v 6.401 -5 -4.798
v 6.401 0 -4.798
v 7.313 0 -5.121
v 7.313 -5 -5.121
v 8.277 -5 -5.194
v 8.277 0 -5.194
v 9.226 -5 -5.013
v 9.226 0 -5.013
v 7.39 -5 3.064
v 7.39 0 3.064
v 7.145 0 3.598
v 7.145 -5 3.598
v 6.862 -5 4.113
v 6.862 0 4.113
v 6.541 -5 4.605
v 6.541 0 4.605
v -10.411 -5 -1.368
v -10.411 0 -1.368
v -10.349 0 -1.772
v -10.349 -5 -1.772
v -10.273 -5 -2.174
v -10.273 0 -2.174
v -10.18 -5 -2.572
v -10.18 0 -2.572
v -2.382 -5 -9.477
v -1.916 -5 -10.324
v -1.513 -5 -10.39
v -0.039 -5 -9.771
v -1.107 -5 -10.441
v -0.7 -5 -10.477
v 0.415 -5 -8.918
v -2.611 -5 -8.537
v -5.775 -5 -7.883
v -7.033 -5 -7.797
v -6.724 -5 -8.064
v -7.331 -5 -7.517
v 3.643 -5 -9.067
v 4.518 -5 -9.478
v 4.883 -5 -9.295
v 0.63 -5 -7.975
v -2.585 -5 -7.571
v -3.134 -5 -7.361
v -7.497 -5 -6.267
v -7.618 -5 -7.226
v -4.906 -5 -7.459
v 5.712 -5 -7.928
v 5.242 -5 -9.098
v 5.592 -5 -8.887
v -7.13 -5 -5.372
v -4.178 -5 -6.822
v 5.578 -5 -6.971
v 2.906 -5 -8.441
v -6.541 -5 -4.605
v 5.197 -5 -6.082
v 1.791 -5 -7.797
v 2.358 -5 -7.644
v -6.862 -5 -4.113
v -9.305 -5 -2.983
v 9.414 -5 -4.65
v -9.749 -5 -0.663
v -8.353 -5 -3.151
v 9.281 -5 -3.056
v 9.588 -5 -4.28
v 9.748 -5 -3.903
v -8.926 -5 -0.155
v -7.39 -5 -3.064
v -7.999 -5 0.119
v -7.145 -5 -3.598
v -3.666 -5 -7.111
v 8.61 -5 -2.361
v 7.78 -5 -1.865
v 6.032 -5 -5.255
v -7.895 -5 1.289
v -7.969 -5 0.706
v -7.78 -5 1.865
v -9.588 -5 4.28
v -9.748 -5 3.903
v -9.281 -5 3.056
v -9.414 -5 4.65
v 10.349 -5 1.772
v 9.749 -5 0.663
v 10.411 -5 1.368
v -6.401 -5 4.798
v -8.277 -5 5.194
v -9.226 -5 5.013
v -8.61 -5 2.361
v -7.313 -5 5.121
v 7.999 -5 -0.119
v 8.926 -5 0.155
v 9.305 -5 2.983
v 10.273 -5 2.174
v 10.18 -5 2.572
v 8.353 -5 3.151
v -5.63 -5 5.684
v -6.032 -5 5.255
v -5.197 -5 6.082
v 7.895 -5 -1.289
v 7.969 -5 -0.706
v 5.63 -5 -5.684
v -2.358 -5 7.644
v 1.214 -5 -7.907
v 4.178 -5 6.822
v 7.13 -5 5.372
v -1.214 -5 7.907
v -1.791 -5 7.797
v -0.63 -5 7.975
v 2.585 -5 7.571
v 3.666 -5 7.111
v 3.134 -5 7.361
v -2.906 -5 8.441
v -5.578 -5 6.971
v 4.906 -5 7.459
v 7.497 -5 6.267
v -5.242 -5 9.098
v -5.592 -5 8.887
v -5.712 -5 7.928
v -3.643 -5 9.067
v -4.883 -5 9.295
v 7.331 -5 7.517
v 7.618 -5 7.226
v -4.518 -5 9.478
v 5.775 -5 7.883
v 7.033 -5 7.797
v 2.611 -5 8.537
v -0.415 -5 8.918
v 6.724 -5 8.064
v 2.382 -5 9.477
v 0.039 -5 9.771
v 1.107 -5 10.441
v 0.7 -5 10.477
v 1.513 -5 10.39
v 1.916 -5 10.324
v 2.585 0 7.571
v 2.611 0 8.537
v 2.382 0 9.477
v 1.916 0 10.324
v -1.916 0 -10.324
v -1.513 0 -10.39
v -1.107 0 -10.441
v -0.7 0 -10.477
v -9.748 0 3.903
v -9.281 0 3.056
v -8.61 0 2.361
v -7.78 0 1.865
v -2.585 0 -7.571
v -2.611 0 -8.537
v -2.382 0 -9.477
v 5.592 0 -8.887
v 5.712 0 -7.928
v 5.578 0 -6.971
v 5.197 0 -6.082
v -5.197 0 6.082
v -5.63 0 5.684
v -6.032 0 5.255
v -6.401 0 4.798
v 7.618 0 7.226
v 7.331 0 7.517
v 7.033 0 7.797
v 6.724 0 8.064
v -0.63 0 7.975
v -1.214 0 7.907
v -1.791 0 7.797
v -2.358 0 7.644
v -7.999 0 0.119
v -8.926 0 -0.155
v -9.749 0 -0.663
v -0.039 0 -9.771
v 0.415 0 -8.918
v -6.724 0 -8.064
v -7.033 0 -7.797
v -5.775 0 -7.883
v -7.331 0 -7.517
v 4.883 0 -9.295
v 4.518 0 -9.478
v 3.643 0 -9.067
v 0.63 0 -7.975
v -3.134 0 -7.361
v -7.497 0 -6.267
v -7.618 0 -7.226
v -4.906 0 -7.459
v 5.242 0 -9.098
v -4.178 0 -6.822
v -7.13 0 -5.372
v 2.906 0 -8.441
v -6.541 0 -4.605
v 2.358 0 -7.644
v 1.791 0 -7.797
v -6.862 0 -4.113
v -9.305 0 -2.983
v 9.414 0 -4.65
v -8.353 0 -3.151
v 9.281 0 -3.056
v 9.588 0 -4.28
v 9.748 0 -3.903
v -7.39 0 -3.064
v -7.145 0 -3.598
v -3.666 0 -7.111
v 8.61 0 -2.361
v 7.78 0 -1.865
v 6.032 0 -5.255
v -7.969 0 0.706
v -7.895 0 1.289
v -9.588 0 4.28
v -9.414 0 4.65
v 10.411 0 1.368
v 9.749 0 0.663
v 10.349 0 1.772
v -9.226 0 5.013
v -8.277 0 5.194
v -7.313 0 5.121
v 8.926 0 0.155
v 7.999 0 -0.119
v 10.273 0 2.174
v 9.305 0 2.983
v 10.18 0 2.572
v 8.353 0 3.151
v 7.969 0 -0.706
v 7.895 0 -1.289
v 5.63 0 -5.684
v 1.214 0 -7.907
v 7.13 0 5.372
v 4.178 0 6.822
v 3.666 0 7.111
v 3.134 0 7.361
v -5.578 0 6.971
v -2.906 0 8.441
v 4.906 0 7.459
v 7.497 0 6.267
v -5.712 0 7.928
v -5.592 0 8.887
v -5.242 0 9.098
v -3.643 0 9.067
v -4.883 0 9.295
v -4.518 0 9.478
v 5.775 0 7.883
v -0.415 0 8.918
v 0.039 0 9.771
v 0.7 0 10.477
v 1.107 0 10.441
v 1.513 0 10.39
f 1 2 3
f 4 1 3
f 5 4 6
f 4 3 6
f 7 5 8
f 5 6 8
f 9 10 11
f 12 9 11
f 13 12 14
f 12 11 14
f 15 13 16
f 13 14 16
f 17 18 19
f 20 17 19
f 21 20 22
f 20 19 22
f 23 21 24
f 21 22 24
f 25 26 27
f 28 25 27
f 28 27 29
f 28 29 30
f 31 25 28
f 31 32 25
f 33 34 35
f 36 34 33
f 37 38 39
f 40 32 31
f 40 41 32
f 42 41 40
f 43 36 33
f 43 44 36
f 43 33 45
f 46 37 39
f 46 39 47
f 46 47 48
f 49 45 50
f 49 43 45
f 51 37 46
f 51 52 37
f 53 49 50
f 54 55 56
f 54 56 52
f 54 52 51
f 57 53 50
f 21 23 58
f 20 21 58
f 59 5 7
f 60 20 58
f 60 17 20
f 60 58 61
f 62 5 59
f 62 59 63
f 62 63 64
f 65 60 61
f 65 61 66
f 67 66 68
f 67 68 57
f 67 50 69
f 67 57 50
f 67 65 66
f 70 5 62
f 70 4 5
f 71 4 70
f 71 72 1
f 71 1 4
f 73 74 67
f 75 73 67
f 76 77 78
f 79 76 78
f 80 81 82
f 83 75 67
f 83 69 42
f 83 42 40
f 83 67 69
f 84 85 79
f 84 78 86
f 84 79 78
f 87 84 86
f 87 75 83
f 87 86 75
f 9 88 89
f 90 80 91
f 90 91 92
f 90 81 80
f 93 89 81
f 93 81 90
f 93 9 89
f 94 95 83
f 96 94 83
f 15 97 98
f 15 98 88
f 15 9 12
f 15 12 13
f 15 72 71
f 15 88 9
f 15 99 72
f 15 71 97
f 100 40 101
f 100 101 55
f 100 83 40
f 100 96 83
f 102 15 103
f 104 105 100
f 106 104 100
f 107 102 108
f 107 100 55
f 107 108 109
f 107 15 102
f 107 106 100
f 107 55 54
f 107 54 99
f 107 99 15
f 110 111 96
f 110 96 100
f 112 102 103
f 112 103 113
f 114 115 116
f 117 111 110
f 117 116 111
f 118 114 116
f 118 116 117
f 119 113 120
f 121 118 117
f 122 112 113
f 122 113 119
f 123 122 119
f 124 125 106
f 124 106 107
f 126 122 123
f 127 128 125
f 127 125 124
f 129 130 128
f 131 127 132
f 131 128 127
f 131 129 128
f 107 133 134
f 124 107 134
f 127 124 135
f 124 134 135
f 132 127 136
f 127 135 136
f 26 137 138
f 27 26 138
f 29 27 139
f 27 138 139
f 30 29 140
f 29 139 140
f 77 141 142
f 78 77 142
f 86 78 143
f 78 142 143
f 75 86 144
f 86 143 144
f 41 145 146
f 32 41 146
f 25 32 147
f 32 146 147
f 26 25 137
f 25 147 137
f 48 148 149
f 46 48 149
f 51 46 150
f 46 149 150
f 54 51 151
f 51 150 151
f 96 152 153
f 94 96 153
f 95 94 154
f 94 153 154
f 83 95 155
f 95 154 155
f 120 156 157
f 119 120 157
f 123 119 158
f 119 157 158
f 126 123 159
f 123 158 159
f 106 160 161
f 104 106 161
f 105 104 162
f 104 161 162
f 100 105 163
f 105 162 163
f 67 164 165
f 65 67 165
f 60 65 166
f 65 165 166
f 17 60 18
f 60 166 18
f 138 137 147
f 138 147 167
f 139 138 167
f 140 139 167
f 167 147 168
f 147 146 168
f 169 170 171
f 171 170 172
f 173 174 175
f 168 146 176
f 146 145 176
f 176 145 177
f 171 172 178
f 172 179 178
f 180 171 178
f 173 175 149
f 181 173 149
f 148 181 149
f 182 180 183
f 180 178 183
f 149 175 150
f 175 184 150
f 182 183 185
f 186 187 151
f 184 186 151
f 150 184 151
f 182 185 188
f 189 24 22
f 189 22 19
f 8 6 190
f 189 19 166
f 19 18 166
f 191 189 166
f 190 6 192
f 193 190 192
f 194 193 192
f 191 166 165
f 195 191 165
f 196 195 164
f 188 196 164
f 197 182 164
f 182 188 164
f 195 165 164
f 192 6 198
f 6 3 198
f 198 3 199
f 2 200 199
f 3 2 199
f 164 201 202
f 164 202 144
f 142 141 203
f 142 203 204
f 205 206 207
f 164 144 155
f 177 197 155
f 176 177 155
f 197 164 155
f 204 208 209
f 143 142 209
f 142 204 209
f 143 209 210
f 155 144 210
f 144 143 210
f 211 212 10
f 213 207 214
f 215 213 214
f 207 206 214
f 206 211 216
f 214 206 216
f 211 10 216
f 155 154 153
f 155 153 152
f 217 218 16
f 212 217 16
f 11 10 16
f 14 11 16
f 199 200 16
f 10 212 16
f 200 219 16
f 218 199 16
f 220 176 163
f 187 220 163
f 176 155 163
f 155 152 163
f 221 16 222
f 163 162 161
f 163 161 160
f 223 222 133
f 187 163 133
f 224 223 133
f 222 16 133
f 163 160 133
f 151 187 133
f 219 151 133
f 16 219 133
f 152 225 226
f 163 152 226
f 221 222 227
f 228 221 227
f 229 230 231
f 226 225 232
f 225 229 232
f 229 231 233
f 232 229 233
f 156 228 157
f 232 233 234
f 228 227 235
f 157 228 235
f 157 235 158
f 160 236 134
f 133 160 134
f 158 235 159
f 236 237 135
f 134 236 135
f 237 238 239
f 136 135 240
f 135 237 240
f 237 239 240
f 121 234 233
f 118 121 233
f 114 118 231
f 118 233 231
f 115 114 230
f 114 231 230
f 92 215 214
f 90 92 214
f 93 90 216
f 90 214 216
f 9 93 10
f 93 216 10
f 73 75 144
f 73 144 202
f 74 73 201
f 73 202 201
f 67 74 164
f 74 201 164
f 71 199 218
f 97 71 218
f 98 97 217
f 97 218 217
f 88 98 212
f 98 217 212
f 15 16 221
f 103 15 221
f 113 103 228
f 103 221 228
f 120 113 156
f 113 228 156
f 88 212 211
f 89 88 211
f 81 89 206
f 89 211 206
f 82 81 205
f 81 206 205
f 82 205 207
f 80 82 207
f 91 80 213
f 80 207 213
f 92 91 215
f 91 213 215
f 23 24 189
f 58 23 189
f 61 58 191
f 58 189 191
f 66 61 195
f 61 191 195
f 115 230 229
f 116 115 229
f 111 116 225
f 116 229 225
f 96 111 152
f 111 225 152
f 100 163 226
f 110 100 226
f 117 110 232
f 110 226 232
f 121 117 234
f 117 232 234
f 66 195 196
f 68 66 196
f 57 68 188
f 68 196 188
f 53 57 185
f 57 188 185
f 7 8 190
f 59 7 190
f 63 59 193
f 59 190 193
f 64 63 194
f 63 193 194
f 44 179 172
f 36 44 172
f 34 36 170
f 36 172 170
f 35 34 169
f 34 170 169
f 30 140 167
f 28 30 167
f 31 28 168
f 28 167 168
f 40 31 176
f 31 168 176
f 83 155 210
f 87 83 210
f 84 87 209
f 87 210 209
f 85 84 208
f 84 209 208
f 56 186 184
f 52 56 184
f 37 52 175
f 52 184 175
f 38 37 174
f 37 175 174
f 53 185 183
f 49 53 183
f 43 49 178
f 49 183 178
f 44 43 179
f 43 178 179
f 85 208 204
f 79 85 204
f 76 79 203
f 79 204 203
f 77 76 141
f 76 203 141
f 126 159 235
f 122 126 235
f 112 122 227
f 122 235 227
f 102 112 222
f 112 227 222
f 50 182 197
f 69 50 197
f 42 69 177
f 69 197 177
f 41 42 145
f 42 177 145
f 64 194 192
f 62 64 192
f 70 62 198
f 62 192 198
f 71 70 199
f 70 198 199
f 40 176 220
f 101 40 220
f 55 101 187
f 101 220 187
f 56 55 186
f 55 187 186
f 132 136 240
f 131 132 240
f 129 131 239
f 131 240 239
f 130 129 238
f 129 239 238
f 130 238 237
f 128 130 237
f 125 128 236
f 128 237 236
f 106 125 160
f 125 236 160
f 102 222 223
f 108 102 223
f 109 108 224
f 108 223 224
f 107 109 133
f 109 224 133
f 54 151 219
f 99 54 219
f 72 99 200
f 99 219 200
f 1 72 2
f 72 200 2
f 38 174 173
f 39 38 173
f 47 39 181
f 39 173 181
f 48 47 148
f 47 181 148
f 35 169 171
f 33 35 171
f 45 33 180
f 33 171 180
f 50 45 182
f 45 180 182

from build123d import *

# Parameters (mm, degrees)
F2_DEPTH = 5
F3_DEPTH = 5
F5_COUNT = 10
F5_ANGLE = 324


with BuildPart() as f2:
    # F1 (on Front) → F2 (new body)
    with BuildSketch(Plane.XZ):
        with BuildLine():
            ThreePointArc((7.9991114538, -0.1192306565), (7.9997778604, -0.0596169837), (8, 0))
            ThreePointArc((8, 0), (7.8460497183, 1.5618911033), (7.3901240454, 3.0636688127))
            ThreePointArc((7.3901240454, 3.0636688127), (-7.857471258, -1.5033780063), (7.9991114538, -0.1192306565))
        make_face()
    extrude(amount=F2_DEPTH)

    # F1 (on Front) → F3 (join)
    with BuildSketch(Plane.XZ):
        with BuildLine():
            ThreePointArc((7.3901240454, 3.0636688127), (7.8460497183, 1.5618911033), (8, 0))
            ThreePointArc((8, 0), (7.9997778604, -0.0596169837), (7.9991114538, -0.1192306565))
            ThreePointArc((7.9991114538, -0.1192306565), (9.3543332011, 0.3818427302), (10.4105264675, 1.3678226019))
            ThreePointArc((10.4105264675, 1.3678226019), (10.3129310261, 1.9731836333), (10.180165277, 2.5718154938))
            ThreePointArc((10.180165277, 2.5718154938), (8.8345975473, 3.0982639794), (7.3901240454, 3.0636688127))
        make_face()
    extrude(amount=F3_DEPTH)

    # F5: F2 ×10 about axis
    f5_axis = Axis((0, 6.1465417966, 0), (0, 1, 0))


with BuildPart() as f2_1:
    add(f2.part)
    for i in range(1, F5_COUNT):
        add(f2.part.rotate(f5_axis, i * F5_ANGLE / (F5_COUNT - 1)))


solid = f2_1.part
